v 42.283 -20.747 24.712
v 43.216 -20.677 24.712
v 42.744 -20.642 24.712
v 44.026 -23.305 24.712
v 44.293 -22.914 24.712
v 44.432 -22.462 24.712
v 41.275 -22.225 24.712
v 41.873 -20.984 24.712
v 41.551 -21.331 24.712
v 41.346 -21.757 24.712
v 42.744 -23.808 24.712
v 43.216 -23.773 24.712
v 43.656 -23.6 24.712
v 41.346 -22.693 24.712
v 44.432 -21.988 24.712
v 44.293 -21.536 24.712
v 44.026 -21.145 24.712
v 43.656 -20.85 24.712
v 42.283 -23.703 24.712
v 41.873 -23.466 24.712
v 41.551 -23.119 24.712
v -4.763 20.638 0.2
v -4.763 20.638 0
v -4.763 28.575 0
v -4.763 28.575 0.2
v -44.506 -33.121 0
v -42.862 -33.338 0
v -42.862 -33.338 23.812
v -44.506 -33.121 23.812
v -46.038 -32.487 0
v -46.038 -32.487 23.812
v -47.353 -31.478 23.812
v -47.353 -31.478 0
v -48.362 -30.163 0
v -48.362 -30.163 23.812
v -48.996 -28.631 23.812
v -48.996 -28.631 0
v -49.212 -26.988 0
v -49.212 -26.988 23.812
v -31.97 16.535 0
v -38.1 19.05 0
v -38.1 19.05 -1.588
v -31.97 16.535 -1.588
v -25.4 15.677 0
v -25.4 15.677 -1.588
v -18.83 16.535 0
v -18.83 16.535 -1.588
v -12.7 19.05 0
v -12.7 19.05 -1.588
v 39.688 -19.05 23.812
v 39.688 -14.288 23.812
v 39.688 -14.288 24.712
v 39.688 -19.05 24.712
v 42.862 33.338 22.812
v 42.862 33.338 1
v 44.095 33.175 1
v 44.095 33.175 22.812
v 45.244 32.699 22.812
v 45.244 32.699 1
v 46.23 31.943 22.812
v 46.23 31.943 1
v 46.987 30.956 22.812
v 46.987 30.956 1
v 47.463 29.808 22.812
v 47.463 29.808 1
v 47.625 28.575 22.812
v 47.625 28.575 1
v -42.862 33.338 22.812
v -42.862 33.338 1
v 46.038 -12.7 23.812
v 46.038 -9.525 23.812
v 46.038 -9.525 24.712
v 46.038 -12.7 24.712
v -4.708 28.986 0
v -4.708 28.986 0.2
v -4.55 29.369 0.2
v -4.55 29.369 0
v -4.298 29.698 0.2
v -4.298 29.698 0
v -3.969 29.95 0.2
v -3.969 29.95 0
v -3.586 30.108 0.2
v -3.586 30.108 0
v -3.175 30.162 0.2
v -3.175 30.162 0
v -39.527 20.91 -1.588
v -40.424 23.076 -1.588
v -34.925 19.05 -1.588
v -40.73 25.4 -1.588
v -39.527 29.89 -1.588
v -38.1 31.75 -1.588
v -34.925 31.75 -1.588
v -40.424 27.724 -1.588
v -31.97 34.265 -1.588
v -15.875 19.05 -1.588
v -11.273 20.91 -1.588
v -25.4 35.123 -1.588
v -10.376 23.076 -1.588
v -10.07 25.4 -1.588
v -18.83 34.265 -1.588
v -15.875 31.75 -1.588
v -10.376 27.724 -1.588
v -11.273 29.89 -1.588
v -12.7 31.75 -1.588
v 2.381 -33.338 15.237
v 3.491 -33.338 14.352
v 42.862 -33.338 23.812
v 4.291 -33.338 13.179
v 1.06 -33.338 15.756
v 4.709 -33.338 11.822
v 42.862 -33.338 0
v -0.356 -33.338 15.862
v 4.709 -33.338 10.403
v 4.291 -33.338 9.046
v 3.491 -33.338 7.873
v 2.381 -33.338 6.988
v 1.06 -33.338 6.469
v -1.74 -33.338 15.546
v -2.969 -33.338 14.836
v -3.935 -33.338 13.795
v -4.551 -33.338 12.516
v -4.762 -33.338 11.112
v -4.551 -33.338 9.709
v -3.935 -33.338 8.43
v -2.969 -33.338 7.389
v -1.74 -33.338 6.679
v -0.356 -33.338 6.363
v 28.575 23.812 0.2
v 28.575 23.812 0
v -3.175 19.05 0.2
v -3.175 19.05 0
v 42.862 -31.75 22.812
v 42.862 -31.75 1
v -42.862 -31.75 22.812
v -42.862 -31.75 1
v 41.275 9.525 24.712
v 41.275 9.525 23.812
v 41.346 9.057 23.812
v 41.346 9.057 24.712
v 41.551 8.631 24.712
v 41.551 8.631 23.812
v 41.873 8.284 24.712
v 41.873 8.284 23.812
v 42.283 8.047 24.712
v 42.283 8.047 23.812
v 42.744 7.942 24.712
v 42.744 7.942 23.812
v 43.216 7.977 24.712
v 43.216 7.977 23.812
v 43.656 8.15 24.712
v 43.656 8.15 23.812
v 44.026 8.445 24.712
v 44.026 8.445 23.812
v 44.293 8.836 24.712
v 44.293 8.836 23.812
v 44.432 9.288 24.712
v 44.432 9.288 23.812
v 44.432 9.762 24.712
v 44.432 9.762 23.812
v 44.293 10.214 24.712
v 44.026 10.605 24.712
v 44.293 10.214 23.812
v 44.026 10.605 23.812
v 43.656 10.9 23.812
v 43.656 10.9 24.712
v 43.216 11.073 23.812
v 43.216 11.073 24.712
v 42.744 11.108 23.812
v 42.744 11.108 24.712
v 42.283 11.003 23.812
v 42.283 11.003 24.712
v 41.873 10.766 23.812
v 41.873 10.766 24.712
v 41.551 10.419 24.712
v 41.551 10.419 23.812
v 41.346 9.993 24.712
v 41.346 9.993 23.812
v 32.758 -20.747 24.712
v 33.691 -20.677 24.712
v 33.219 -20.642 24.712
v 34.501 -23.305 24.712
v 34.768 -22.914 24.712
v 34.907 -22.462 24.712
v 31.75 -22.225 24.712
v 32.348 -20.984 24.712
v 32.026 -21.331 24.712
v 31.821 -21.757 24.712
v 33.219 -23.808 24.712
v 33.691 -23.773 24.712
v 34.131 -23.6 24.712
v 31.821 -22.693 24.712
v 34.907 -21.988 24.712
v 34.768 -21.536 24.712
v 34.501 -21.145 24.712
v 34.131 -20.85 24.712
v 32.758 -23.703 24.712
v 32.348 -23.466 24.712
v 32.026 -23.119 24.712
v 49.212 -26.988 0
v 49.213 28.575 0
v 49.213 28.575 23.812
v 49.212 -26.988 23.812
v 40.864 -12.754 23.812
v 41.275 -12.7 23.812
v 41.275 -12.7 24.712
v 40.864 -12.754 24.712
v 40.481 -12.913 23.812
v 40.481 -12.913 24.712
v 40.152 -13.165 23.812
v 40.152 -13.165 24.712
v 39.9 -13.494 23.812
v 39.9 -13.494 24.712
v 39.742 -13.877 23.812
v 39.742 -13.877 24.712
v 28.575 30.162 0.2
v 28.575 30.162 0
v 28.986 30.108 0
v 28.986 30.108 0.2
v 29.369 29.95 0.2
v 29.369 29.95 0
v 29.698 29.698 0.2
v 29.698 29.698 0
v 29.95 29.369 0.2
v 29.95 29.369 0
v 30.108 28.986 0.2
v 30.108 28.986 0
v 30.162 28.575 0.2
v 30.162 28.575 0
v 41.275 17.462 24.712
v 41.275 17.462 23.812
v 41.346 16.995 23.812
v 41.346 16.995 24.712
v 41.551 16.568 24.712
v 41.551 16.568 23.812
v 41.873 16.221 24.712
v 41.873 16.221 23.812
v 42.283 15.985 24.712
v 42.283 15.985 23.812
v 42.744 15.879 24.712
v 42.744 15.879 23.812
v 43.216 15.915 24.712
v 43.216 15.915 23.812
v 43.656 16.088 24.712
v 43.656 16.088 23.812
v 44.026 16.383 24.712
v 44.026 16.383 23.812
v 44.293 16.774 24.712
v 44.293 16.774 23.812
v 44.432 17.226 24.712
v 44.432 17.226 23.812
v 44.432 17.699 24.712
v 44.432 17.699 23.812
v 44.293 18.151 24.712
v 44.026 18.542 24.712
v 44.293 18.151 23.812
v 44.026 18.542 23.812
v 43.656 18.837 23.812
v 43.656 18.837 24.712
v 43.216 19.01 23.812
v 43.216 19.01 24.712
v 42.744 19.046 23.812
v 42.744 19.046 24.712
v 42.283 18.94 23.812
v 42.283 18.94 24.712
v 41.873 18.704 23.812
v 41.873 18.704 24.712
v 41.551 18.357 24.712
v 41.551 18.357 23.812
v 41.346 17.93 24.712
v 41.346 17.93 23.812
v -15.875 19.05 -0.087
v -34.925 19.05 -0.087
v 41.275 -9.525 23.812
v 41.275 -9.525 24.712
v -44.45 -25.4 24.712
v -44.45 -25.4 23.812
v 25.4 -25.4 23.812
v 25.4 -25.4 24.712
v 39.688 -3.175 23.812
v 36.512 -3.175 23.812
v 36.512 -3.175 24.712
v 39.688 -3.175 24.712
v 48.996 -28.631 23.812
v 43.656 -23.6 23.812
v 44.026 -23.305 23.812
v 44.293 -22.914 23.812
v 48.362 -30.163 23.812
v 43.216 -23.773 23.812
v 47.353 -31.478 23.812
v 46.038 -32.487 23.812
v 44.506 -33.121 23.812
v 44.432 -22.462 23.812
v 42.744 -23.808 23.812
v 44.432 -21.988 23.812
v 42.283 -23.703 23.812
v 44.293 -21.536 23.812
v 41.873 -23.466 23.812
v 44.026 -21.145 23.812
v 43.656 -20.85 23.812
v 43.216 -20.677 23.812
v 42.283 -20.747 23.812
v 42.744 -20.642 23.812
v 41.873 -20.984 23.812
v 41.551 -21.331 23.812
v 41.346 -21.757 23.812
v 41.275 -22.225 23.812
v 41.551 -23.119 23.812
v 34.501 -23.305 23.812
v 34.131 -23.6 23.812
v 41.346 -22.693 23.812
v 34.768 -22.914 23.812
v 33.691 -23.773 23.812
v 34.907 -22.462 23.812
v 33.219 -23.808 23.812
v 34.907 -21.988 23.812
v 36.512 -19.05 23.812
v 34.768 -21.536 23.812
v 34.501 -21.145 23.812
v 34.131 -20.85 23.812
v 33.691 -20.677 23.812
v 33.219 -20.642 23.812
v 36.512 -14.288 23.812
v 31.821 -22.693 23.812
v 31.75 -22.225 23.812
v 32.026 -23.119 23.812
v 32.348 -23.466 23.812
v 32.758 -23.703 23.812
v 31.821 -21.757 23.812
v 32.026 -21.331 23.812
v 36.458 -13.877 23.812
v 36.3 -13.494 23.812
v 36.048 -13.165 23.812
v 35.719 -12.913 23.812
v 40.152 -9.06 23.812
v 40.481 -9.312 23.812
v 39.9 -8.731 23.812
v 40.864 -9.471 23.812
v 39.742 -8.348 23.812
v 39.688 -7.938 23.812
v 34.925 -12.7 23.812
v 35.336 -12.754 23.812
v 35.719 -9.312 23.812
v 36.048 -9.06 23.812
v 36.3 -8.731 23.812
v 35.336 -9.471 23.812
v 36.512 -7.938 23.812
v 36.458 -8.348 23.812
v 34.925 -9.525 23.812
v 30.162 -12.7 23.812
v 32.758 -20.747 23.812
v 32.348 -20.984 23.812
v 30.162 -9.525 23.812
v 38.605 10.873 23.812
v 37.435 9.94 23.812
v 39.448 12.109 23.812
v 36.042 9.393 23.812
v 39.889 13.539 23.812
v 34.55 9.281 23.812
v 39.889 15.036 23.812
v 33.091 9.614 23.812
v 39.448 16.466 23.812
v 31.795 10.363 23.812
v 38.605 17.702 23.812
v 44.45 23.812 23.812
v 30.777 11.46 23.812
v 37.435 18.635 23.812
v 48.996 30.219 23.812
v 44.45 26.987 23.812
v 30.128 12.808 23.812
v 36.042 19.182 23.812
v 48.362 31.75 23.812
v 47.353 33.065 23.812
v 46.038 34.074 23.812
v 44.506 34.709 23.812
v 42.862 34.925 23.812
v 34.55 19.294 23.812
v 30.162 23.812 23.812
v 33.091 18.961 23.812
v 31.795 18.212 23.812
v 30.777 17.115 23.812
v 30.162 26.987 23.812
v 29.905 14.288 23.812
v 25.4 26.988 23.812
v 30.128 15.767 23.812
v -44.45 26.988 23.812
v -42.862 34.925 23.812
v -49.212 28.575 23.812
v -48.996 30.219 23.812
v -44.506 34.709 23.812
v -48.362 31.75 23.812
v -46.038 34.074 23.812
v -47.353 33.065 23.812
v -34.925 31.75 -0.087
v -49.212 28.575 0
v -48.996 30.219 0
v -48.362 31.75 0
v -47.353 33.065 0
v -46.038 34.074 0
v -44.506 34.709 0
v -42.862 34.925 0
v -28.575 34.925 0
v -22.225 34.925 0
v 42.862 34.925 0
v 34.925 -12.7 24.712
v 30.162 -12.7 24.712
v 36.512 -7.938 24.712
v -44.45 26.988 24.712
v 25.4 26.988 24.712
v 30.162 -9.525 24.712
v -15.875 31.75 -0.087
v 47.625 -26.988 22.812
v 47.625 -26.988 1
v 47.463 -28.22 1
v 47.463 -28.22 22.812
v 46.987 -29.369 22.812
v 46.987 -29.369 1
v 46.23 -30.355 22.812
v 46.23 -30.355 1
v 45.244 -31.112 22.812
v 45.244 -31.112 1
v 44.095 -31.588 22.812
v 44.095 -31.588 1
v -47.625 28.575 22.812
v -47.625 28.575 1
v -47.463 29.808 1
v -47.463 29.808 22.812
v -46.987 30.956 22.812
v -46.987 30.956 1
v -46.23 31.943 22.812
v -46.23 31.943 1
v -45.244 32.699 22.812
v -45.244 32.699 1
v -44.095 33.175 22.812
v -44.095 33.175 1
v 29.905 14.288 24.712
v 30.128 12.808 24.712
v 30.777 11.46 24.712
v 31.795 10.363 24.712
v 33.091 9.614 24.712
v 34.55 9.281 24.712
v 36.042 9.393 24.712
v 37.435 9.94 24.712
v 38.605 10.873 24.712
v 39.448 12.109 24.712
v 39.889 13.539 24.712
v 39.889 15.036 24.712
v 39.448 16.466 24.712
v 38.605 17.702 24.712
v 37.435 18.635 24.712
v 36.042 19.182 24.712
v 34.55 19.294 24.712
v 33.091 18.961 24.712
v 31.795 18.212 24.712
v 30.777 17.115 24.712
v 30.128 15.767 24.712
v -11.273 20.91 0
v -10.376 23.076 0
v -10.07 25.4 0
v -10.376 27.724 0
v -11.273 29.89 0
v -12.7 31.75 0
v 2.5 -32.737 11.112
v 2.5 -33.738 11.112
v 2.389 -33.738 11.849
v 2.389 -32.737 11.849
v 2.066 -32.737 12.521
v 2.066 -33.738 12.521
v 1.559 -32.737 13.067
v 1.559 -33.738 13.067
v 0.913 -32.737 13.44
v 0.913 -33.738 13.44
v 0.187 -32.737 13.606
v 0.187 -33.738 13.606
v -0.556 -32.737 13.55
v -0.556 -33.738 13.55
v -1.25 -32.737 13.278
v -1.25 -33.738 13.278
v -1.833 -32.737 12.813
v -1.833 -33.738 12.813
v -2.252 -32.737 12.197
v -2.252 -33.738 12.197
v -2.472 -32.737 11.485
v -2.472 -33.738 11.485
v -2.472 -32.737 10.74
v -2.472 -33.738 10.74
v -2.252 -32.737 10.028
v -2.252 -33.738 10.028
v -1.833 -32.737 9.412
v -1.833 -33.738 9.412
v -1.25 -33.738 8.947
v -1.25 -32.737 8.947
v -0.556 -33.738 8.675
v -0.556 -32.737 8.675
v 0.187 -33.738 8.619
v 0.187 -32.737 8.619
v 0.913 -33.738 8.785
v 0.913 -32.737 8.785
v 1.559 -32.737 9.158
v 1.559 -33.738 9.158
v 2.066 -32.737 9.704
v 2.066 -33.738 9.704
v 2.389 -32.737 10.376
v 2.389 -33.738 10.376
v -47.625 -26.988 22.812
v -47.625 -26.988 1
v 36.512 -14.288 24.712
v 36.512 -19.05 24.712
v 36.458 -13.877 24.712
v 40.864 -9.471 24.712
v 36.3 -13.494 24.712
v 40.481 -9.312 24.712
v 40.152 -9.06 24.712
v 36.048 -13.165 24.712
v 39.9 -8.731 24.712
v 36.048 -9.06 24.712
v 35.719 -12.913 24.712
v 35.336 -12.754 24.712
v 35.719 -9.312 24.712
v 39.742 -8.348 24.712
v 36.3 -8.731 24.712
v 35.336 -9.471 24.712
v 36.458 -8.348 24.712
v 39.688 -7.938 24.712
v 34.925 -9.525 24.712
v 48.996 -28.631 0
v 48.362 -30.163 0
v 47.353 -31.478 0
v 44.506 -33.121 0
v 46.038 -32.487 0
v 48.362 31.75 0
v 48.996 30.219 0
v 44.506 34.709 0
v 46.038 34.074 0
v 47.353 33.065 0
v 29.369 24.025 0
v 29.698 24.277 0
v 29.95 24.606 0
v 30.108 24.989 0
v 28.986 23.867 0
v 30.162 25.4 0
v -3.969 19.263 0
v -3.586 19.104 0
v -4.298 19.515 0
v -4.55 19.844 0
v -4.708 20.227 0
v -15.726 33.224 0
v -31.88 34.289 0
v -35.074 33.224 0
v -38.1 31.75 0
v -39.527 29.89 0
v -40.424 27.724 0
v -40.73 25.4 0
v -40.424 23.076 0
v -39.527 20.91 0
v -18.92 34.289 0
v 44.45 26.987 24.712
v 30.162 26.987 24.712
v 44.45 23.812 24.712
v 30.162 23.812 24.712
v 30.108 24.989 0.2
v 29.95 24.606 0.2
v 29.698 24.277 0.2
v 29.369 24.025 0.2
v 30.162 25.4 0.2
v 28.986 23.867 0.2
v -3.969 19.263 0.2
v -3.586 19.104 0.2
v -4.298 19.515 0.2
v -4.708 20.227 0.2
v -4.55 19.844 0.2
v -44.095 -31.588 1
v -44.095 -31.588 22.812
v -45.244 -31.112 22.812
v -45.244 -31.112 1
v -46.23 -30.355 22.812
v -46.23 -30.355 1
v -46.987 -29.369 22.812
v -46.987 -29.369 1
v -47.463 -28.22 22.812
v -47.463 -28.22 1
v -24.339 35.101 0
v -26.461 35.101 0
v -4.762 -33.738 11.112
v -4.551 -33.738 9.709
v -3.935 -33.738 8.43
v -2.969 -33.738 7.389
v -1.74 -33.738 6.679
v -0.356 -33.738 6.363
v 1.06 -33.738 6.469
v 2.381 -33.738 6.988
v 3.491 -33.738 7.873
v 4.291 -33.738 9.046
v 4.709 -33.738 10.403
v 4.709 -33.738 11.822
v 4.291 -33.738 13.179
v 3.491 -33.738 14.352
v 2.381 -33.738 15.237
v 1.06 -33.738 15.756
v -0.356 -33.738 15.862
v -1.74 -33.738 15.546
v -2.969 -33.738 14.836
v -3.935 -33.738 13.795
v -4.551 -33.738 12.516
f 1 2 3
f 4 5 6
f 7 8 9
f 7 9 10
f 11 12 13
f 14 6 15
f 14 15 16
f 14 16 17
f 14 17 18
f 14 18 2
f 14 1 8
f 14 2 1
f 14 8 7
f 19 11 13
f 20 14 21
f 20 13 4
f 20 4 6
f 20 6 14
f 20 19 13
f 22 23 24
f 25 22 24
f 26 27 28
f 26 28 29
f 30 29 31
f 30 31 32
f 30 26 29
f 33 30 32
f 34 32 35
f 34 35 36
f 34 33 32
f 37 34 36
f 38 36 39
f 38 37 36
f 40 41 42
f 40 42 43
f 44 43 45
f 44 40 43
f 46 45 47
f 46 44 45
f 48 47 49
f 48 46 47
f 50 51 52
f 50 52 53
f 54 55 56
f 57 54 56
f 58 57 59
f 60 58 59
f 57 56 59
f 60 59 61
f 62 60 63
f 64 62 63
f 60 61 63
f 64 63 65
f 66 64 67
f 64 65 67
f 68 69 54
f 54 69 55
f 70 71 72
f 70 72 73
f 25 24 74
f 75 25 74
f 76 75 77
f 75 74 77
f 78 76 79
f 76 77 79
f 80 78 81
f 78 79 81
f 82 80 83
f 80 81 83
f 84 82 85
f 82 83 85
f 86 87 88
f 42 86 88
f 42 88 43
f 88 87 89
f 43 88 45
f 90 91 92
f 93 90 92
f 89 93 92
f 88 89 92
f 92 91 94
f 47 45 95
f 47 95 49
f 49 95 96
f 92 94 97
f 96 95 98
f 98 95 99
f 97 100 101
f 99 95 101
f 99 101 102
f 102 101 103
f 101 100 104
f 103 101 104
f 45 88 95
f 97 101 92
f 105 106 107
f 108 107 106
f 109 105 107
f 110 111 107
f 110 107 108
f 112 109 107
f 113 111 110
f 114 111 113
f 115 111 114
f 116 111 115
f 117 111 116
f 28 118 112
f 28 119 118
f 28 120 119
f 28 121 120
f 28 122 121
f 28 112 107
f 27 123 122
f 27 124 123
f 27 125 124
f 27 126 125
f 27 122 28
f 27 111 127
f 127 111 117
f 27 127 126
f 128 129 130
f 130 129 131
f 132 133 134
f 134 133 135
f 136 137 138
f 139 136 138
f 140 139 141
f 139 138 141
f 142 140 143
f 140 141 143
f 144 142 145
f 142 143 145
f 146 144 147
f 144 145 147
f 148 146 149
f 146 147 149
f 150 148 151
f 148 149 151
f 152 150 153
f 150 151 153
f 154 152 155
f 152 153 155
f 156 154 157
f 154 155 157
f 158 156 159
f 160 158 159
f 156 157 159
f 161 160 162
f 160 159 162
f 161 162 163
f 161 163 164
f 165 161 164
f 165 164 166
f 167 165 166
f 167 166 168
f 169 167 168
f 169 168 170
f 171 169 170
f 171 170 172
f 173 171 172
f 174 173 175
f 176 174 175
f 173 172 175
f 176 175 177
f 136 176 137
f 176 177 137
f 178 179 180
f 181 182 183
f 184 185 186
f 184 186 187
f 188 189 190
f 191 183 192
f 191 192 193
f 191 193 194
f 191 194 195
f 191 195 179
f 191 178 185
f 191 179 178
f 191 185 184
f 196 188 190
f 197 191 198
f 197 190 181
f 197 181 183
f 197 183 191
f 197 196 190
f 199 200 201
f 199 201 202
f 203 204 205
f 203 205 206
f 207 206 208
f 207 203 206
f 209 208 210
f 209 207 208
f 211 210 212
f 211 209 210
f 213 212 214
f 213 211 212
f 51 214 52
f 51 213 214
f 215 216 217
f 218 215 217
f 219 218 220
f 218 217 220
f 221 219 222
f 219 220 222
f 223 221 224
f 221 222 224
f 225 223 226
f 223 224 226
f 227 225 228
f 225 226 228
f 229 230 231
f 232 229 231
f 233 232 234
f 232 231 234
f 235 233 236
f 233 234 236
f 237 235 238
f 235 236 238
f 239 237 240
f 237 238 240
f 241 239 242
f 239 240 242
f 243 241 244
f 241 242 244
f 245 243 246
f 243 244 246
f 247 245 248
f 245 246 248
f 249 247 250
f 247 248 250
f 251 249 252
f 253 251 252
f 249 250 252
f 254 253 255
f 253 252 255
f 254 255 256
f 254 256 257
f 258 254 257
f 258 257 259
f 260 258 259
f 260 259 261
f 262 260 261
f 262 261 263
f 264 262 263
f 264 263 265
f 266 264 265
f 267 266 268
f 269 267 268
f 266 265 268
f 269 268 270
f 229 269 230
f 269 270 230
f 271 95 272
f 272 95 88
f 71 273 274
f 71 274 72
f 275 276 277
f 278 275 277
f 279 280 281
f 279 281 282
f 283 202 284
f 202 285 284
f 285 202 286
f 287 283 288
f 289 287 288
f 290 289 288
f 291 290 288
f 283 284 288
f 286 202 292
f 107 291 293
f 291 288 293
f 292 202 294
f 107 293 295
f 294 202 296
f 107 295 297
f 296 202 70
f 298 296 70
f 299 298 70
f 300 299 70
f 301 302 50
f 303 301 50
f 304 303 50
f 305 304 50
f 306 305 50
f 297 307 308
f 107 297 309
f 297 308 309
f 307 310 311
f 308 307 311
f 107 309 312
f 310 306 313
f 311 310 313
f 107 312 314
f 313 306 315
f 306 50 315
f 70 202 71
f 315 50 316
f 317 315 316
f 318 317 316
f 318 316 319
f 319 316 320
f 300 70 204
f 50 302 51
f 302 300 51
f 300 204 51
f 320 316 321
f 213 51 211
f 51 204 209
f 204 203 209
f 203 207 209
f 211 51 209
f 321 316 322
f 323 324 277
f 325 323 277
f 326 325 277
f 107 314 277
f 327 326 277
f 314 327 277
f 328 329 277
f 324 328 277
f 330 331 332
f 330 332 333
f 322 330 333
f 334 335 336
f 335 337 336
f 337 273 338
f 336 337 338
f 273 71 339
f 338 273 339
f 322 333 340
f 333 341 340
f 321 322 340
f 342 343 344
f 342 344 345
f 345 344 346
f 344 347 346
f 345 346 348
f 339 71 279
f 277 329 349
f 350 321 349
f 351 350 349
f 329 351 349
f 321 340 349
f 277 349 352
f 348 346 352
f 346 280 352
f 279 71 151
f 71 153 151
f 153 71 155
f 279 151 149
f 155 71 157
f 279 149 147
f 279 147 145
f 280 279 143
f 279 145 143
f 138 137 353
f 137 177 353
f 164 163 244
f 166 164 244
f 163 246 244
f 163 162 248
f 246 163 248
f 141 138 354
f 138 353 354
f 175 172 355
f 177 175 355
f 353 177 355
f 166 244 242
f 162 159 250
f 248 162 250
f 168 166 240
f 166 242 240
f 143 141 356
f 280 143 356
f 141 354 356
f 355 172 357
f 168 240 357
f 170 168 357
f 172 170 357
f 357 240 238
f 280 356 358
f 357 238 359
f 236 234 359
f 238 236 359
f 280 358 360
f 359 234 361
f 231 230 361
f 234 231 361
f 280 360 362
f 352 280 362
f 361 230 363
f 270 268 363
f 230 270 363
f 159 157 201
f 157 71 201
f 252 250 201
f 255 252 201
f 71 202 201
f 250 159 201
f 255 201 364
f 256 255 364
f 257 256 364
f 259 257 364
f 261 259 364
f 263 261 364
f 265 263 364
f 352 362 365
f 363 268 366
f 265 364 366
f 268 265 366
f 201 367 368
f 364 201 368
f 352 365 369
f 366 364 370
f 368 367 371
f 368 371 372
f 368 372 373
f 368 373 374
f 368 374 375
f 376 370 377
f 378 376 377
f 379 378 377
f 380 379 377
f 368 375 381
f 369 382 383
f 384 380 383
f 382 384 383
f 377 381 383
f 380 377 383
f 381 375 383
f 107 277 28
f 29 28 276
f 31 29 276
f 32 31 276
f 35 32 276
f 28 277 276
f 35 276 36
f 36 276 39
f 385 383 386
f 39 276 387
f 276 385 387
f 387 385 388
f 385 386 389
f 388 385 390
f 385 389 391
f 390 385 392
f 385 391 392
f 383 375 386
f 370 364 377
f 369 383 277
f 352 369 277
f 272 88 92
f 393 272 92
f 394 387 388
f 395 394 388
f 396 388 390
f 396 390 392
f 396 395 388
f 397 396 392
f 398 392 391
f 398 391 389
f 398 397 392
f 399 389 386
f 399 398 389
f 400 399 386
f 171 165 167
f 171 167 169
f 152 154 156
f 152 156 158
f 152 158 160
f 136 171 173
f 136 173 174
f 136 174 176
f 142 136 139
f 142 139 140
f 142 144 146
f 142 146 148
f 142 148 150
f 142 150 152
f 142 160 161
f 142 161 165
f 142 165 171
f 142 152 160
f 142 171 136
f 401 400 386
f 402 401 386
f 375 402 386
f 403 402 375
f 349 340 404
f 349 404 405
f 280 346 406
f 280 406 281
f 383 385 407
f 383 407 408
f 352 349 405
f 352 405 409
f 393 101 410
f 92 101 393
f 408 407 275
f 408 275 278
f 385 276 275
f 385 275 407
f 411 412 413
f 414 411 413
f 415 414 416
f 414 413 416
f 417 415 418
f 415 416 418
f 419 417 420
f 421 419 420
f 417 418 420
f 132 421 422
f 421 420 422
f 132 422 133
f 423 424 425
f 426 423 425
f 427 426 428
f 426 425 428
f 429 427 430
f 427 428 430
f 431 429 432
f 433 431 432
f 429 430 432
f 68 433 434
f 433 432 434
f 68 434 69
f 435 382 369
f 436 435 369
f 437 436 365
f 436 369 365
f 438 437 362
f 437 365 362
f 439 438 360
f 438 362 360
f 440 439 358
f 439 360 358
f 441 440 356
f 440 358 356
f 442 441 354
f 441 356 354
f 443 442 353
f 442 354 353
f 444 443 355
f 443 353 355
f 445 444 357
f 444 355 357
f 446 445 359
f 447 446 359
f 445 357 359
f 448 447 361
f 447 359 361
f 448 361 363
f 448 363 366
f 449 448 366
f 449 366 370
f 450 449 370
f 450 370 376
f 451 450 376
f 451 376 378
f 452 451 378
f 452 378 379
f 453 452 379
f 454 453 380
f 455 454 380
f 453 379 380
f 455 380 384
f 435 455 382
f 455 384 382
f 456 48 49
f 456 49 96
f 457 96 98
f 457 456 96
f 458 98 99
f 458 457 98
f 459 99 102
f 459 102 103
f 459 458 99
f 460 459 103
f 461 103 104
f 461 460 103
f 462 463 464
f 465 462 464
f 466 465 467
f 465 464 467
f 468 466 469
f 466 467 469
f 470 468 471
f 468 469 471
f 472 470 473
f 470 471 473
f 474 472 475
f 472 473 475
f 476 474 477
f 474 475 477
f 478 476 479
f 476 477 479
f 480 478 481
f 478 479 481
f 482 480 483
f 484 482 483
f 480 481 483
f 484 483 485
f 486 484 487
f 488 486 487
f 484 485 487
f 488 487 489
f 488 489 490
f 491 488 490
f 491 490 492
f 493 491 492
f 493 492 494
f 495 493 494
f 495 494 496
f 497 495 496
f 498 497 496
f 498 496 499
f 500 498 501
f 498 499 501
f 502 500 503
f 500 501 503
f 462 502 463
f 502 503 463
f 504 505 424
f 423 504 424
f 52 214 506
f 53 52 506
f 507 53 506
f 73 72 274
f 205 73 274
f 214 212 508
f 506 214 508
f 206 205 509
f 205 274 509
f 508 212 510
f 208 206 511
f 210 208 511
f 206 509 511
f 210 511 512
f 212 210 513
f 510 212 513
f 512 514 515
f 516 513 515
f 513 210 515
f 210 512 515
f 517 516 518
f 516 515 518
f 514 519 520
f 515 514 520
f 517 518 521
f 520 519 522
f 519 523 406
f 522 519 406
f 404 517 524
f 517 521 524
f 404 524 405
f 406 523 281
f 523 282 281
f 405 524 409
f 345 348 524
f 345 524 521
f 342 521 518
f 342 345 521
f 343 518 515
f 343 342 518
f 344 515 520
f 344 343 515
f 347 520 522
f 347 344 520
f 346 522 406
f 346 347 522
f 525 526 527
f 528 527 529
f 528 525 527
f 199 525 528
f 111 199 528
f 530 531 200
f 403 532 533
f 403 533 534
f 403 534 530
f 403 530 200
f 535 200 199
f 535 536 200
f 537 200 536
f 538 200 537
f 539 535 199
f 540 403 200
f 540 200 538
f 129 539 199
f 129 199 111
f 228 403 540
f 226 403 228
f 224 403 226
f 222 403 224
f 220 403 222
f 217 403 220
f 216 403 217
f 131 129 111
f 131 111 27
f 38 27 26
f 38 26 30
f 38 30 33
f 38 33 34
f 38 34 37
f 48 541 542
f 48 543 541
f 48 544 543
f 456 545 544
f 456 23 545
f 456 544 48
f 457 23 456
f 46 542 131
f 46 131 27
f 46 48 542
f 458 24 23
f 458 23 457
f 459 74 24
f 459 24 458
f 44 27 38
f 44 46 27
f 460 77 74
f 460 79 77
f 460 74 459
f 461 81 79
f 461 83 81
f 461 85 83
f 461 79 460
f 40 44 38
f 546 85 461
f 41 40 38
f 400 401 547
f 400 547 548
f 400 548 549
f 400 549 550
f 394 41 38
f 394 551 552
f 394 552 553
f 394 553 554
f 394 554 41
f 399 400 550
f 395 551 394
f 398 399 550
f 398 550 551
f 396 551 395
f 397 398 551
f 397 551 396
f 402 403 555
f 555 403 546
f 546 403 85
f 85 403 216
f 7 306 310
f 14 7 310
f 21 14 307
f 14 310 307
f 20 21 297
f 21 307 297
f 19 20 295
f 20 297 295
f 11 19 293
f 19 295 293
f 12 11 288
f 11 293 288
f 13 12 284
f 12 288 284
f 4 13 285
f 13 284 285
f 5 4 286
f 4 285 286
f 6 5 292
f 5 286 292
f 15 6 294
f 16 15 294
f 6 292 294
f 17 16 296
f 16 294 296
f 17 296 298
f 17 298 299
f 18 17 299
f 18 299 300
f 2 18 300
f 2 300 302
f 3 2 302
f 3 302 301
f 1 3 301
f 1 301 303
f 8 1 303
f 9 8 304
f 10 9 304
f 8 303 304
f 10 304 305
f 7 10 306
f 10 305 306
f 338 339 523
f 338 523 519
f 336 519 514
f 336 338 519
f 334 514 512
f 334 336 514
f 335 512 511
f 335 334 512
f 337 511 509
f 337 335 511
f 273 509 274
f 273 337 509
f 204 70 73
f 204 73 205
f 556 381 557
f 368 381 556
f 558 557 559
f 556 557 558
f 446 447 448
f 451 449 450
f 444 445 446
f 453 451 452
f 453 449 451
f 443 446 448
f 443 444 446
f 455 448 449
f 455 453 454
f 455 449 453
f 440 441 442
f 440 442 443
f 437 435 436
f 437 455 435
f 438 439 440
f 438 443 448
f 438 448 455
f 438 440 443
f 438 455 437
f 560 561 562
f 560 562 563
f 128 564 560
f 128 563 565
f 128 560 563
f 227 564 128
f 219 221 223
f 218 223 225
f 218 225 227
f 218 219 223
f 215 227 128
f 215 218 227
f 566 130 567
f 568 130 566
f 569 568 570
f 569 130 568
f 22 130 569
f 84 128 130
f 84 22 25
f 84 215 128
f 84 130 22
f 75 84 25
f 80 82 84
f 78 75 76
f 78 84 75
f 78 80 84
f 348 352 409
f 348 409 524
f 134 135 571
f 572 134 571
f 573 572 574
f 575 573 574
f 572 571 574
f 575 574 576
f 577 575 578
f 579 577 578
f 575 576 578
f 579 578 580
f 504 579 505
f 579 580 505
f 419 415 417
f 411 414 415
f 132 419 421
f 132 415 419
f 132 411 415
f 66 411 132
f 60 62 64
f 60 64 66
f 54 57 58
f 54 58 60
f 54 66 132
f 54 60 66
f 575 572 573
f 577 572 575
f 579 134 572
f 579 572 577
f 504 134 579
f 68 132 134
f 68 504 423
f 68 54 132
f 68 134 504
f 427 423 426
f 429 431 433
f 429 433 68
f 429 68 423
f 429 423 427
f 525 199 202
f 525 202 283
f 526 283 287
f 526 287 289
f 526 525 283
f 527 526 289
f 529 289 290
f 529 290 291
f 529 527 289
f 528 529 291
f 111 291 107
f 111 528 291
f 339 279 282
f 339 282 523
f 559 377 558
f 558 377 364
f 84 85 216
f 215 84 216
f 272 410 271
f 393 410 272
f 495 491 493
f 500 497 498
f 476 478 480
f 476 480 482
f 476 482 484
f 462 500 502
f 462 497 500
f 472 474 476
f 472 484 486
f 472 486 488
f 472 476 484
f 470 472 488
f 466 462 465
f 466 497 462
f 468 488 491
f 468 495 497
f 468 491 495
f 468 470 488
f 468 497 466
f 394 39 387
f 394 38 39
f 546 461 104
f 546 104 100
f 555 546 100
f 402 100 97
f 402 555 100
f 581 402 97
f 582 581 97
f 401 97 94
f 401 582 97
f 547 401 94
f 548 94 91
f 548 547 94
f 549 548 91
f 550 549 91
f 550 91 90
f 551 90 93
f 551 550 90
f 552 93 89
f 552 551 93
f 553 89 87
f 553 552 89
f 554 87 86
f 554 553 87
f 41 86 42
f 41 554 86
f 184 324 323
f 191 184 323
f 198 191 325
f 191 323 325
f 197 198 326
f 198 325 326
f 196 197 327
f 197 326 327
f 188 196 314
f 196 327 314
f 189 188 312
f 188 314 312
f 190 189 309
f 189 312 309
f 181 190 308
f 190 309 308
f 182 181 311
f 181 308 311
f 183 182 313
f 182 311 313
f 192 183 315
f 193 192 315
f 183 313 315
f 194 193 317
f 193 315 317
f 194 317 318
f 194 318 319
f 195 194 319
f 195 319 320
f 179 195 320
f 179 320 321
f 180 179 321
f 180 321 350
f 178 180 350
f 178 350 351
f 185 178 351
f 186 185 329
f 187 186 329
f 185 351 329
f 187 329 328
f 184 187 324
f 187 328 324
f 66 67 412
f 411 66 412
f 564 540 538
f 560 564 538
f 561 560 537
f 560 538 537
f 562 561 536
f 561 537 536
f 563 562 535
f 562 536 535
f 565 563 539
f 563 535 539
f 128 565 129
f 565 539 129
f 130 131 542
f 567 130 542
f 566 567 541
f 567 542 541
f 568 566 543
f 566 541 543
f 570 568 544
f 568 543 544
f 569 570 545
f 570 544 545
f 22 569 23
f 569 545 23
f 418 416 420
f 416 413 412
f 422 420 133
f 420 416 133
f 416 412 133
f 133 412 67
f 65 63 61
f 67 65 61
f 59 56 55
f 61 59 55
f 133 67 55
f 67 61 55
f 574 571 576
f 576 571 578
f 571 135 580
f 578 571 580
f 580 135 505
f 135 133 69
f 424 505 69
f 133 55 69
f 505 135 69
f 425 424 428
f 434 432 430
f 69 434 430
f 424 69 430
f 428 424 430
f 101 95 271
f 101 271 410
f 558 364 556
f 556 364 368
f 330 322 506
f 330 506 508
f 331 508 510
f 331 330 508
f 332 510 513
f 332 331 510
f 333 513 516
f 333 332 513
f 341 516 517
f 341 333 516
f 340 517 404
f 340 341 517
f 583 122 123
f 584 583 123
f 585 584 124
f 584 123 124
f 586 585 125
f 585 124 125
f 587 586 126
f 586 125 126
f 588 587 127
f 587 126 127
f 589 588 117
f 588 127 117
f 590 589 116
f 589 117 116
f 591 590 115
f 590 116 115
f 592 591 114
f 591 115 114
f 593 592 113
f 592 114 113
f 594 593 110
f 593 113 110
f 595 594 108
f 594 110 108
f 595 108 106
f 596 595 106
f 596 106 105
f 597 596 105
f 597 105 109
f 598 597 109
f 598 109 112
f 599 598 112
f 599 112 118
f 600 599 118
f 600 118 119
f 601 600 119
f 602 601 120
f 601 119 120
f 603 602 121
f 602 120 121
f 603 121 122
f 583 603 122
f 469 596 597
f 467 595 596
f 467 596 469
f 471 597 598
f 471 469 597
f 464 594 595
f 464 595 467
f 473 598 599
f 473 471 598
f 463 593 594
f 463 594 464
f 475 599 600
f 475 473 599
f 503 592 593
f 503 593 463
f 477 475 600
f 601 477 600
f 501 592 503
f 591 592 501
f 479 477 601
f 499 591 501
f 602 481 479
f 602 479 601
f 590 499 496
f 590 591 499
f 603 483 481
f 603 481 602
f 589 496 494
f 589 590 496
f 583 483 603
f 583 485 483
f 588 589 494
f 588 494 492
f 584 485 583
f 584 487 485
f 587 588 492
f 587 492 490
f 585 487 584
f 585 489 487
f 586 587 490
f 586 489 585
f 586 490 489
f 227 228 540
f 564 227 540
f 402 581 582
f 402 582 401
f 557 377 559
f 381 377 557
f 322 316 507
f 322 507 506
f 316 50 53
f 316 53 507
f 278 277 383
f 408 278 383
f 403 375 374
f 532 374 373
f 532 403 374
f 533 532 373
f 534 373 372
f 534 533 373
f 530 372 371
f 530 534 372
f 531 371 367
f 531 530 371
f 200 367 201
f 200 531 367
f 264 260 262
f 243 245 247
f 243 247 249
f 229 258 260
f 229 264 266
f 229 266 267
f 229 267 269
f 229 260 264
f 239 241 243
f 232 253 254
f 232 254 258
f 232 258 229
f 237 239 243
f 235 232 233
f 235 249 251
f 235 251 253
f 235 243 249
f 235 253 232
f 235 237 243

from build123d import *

# Parameters (mm, degrees)
EXTRUDE1_DEPTH     = 1
EXTRUDE9_DEPTH     = 21.8125
EXTRUDE10_DEPTH    = 1
SKETCH14_R         = 1.5875
SKETCH14_R_2       = 5.020115786
SKETCH14_W         = 69.85
SKETCH14_H         = 52.3875
SKETCH14_W_2       = 14.2875
SKETCH14_H_2       = 3.175
EXTRUDE12_DEPTH    = 0.9
CUT_EXTRUDE5_DEPTH = 0.2
EXTRUDE13_DEPTH    = 1.5875
SKETCH17_W         = 19.05
SKETCH17_H         = 12.7
CUT_EXTRUDE6_DEPTH = 1.5
SKETCH18_R         = 4.7625
EXTRUDE14_DEPTH    = 0.4
SKETCH19_R         = 2.5
CUT_EXTRUDE7_DEPTH = 1


with BuildPart() as part:
    # Sketch1 → Extrude1 (new body)
    with BuildSketch(Plane.XY):
        with BuildLine():
            Line((-42.8625, 34.925), (42.8625, 34.925))
            ThreePointArc((42.8625, 34.925), (47.352628061, 33.065128061), (49.2125, 28.575))
            Line((49.2125, 28.575), (49.2125, -26.9875))
            ThreePointArc((49.2125, -26.9875), (47.352628061, -31.477628061), (42.8625, -33.3375))
            Line((42.8625, -33.3375), (-42.8625, -33.3375))
            ThreePointArc((-42.8625, -33.3375), (-47.352628061, -31.477628061), (-49.2125, -26.9875))
            Line((-49.2125, -26.9875), (-49.2125, 28.575))
            ThreePointArc((-49.2125, 28.575), (-47.352628061, 33.065128061), (-42.8625, 34.925))
        make_face()
    extrude(amount=EXTRUDE1_DEPTH)

    # Sketch11 → Extrude9 (add)
    with BuildSketch(Plane.XY.offset(1)):
        with BuildLine():
            Line((-42.8625, 34.925), (42.8625, 34.925))
            ThreePointArc((42.8625, 34.925), (47.352628061, 33.065128061), (49.2125, 28.575))
            Line((49.2125, 28.575), (49.2125, -26.9875))
            ThreePointArc((49.2125, -26.9875), (47.352628061, -31.477628061), (42.8625, -33.3375))
            Line((42.8625, -33.3375), (-42.8625, -33.3375))
            ThreePointArc((-42.8625, -33.3375), (-47.352628061, -31.477628061), (-49.2125, -26.9875))
            Line((-49.2125, -26.9875), (-49.2125, 28.575))
            ThreePointArc((-49.2125, 28.575), (-47.352628061, 33.065128061), (-42.8625, 34.925))
        make_face()
        with BuildLine():
            Line((-42.8625, 33.3375), (42.8625, 33.3375))
            ThreePointArc((42.8625, 33.3375), (46.230096045, 31.942596045), (47.625, 28.575))
            Line((47.625, 28.575), (47.625, -26.9875))
            ThreePointArc((47.625, -26.9875), (46.230096045, -30.355096045), (42.8625, -31.75))
            Line((42.8625, -31.75), (-42.8625, -31.75))
            ThreePointArc((-42.8625, -31.75), (-46.230096045, -30.355096045), (-47.625, -26.9875))
            Line((-47.625, -26.9875), (-47.625, 28.575))
            ThreePointArc((-47.625, 28.575), (-46.230096045, 31.942596045), (-42.8625, 33.3375))
        make_face(mode=Mode.SUBTRACT)
    extrude(amount=EXTRUDE9_DEPTH)

    # Sketch13 → Extrude10 (add)
    with BuildSketch(Plane.XY.offset(22.8125)):
        with BuildLine():
            Line((-42.8625, 34.925), (42.8625, 34.925))
            ThreePointArc((42.8625, 34.925), (47.352628061, 33.065128061), (49.2125, 28.575))
            Line((49.2125, 28.575), (49.2125, -26.9875))
            ThreePointArc((49.2125, -26.9875), (47.352628061, -31.477628061), (42.8625, -33.3375))
            Line((42.8625, -33.3375), (-42.8625, -33.3375))
            ThreePointArc((-42.8625, -33.3375), (-47.352628061, -31.477628061), (-49.2125, -26.9875))
            Line((-49.2125, -26.9875), (-49.2125, 28.575))
            ThreePointArc((-49.2125, 28.575), (-47.352628061, 33.065128061), (-42.8625, 34.925))
        make_face()
    extrude(amount=EXTRUDE10_DEPTH)

    # Sketch14 → Extrude12 (add)
    with BuildSketch(Plane.XY.offset(23.8125)):
        with Locations(Location((42.8625, 17.4625, 0), (0, 0, 180))):
            Circle(SKETCH14_R)
        with Locations(Location((42.8625, 9.525, 0), (0, 0, 180))):
            Circle(SKETCH14_R)
        with Locations(Location((34.925, 14.2875, 0), (0, 0, 180))):
            Circle(SKETCH14_R_2)
        with Locations(Location((33.3375, -22.225, 0), (0, 0, 180))):
            Circle(SKETCH14_R)
        with Locations(Location((42.8625, -22.225, 0), (0, 0, 180))):
            Circle(SKETCH14_R)
        with BuildLine():
            Line((36.5125, -7.9375), (36.5125, -3.175))
            Line((36.5125, -3.175), (39.6875, -3.175))
            Line((39.6875, -3.175), (39.6875, -7.9375))
            ThreePointArc((39.6875, -7.9375), (40.152467985, -9.060032015), (41.275, -9.525))
            Line((41.275, -9.525), (46.0375, -9.525))
            Line((46.0375, -9.525), (46.0375, -12.7))
            Line((46.0375, -12.7), (41.275, -12.7))
            ThreePointArc((41.275, -12.7), (40.152467985, -13.164967985), (39.6875, -14.2875))
            Line((39.6875, -14.2875), (39.6875, -19.05))
            Line((39.6875, -19.05), (36.5125, -19.05))
            Line((36.5125, -19.05), (36.5125, -14.2875))
            ThreePointArc((36.5125, -14.2875), (36.047532015, -13.164967985), (34.925, -12.7))
            Line((34.925, -12.7), (30.1625, -12.7))
            Line((30.1625, -12.7), (30.1625, -9.525))
            Line((30.1625, -9.525), (34.925, -9.525))
            ThreePointArc((34.925, -9.525), (36.047532015, -9.060032015), (36.5125, -7.9375))
        make_face()
        with Locations((-9.525, 0.79375)):
            Rectangle(SKETCH14_W, SKETCH14_H)
        with Locations((37.30625, 25.4)):
            Rectangle(SKETCH14_W_2, SKETCH14_H_2)
    extrude(amount=EXTRUDE12_DEPTH)

    # Sketch15 → Cut-Extrude5 (cut)
    with BuildSketch(Plane(origin=(0, 0, 0), x_dir=(-1, 0, 0), z_dir=(0, 0, -1))):
        with BuildLine():
            Line((3.175, 30.1625), (-28.575, 30.1625))
            ThreePointArc((-28.575, 30.1625), (-29.697532015, 29.697532015), (-30.1625, 28.575))
            Line((-30.1625, 28.575), (-30.1625, 25.4))
            ThreePointArc((-30.1625, 25.4), (-29.697532015, 24.277467985), (-28.575, 23.8125))
            Line((-28.575, 23.8125), (3.175, 19.05))
            ThreePointArc((3.175, 19.05), (4.297532015, 19.514967985), (4.7625, 20.6375))
            Line((4.7625, 20.6375), (4.7625, 28.575))
            ThreePointArc((4.7625, 28.575), (4.297532015, 29.697532015), (3.175, 30.1625))
        make_face()
    extrude(amount=-CUT_EXTRUDE5_DEPTH, mode=Mode.SUBTRACT)

    # Sketch16 → Extrude13 (add)
    with BuildSketch(Plane(origin=(0, 0, 0), x_dir=(-1, 0, 0), z_dir=(0, 0, -1))):
        with BuildLine():
            ThreePointArc((12.7, 31.75), (25.4, 35.122668351), (38.1, 31.75))
            ThreePointArc((38.1, 31.75), (40.730256121, 25.4), (38.1, 19.05))
            ThreePointArc((38.1, 19.05), (25.4, 15.677331649), (12.7, 19.05))
            ThreePointArc((12.7, 19.05), (10.069743879, 25.4), (12.7, 31.75))
        make_face()
    extrude(amount=EXTRUDE13_DEPTH)

    # Sketch17 → Cut-Extrude6 (cut)
    with BuildSketch(Plane(origin=(0, 0, -1.5875), x_dir=(-1, 0, 0), z_dir=(0, 0, -1))):
        with Locations((25.4, 25.4)):
            Rectangle(SKETCH17_W, SKETCH17_H)
    extrude(amount=-CUT_EXTRUDE6_DEPTH, mode=Mode.SUBTRACT)

    # Sketch18 → Extrude14 (add)
    with BuildSketch(Plane.XZ.offset(33.3375)):
        with Locations(Location((0, 11.1125, 0), (0, 0, 180))):
            Circle(SKETCH18_R)
    extrude(amount=EXTRUDE14_DEPTH)

    # Sketch19 → Cut-Extrude7 (cut)
    with BuildSketch(Plane.XZ.offset(33.7375)):
        with Locations((0, 11.1125)):
            Circle(SKETCH19_R)
    extrude(amount=-CUT_EXTRUDE7_DEPTH, mode=Mode.SUBTRACT)


solid = part.part
